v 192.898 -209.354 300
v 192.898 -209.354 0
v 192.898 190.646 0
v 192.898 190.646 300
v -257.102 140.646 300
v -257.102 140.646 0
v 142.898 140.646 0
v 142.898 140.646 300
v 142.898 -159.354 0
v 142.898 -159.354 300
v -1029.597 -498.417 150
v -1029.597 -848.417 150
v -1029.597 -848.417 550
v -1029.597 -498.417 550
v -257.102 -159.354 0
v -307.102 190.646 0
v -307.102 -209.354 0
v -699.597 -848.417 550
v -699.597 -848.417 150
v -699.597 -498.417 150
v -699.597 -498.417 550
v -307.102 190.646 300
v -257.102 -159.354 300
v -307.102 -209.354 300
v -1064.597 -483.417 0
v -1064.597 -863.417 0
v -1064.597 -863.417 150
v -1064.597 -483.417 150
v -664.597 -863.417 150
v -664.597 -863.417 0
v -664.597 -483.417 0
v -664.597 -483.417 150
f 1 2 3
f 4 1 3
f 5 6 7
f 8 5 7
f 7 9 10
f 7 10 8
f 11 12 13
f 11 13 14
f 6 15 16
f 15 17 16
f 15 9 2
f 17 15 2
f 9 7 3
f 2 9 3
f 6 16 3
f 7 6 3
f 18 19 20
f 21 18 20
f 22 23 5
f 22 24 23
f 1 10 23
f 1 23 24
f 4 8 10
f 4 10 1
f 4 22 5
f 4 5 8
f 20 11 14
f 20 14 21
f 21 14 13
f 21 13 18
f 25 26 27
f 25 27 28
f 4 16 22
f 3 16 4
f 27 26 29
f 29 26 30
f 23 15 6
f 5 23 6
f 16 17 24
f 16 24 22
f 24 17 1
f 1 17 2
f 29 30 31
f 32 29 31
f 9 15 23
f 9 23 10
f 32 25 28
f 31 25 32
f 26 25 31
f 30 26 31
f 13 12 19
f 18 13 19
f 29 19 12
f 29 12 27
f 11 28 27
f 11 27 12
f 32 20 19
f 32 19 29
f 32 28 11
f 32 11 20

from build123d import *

# Parameters (mm, degrees)
F0_W     = 500
F0_H     = 400
F1_DEPTH = 300
F2_T     = -50
F3_W     = 400
F3_H     = 380
F4_DEPTH = 150
F5_W     = 330
F5_H     = 350
F6_DEPTH = 400


with BuildPart() as f1:
    # F0 (on Top) → F1 (new body)
    with BuildSketch(Plane.XY):
        with Locations((-57.102057, -9.354085)):
            Rectangle(F0_W, F0_H)
    extrude(amount=F1_DEPTH)

    # F2
    f2_openings = [f1.faces().sort_by_distance(p)[0] for p in [
        (-57.102057, -9.354085, 0),
        (-57.102057, -9.354085, 300),
    ]]
    offset(amount=F2_T, openings=f2_openings)


with BuildPart() as f4:
    # F3 (on Top) → F4 (new body)
    with BuildSketch(Plane.XY):
        with Locations((-864.596963, -673.416553)):
            Rectangle(F3_W, F3_H)
    extrude(amount=F4_DEPTH)

    # F5 (on face) → F6 (join)
    with BuildSketch(Plane.XY.offset(150)):
        with Locations((-864.596963, -673.416553)):
            Rectangle(F5_W, F5_H)
    extrude(amount=F6_DEPTH)


solid = Compound([f1.part, f4.part])
